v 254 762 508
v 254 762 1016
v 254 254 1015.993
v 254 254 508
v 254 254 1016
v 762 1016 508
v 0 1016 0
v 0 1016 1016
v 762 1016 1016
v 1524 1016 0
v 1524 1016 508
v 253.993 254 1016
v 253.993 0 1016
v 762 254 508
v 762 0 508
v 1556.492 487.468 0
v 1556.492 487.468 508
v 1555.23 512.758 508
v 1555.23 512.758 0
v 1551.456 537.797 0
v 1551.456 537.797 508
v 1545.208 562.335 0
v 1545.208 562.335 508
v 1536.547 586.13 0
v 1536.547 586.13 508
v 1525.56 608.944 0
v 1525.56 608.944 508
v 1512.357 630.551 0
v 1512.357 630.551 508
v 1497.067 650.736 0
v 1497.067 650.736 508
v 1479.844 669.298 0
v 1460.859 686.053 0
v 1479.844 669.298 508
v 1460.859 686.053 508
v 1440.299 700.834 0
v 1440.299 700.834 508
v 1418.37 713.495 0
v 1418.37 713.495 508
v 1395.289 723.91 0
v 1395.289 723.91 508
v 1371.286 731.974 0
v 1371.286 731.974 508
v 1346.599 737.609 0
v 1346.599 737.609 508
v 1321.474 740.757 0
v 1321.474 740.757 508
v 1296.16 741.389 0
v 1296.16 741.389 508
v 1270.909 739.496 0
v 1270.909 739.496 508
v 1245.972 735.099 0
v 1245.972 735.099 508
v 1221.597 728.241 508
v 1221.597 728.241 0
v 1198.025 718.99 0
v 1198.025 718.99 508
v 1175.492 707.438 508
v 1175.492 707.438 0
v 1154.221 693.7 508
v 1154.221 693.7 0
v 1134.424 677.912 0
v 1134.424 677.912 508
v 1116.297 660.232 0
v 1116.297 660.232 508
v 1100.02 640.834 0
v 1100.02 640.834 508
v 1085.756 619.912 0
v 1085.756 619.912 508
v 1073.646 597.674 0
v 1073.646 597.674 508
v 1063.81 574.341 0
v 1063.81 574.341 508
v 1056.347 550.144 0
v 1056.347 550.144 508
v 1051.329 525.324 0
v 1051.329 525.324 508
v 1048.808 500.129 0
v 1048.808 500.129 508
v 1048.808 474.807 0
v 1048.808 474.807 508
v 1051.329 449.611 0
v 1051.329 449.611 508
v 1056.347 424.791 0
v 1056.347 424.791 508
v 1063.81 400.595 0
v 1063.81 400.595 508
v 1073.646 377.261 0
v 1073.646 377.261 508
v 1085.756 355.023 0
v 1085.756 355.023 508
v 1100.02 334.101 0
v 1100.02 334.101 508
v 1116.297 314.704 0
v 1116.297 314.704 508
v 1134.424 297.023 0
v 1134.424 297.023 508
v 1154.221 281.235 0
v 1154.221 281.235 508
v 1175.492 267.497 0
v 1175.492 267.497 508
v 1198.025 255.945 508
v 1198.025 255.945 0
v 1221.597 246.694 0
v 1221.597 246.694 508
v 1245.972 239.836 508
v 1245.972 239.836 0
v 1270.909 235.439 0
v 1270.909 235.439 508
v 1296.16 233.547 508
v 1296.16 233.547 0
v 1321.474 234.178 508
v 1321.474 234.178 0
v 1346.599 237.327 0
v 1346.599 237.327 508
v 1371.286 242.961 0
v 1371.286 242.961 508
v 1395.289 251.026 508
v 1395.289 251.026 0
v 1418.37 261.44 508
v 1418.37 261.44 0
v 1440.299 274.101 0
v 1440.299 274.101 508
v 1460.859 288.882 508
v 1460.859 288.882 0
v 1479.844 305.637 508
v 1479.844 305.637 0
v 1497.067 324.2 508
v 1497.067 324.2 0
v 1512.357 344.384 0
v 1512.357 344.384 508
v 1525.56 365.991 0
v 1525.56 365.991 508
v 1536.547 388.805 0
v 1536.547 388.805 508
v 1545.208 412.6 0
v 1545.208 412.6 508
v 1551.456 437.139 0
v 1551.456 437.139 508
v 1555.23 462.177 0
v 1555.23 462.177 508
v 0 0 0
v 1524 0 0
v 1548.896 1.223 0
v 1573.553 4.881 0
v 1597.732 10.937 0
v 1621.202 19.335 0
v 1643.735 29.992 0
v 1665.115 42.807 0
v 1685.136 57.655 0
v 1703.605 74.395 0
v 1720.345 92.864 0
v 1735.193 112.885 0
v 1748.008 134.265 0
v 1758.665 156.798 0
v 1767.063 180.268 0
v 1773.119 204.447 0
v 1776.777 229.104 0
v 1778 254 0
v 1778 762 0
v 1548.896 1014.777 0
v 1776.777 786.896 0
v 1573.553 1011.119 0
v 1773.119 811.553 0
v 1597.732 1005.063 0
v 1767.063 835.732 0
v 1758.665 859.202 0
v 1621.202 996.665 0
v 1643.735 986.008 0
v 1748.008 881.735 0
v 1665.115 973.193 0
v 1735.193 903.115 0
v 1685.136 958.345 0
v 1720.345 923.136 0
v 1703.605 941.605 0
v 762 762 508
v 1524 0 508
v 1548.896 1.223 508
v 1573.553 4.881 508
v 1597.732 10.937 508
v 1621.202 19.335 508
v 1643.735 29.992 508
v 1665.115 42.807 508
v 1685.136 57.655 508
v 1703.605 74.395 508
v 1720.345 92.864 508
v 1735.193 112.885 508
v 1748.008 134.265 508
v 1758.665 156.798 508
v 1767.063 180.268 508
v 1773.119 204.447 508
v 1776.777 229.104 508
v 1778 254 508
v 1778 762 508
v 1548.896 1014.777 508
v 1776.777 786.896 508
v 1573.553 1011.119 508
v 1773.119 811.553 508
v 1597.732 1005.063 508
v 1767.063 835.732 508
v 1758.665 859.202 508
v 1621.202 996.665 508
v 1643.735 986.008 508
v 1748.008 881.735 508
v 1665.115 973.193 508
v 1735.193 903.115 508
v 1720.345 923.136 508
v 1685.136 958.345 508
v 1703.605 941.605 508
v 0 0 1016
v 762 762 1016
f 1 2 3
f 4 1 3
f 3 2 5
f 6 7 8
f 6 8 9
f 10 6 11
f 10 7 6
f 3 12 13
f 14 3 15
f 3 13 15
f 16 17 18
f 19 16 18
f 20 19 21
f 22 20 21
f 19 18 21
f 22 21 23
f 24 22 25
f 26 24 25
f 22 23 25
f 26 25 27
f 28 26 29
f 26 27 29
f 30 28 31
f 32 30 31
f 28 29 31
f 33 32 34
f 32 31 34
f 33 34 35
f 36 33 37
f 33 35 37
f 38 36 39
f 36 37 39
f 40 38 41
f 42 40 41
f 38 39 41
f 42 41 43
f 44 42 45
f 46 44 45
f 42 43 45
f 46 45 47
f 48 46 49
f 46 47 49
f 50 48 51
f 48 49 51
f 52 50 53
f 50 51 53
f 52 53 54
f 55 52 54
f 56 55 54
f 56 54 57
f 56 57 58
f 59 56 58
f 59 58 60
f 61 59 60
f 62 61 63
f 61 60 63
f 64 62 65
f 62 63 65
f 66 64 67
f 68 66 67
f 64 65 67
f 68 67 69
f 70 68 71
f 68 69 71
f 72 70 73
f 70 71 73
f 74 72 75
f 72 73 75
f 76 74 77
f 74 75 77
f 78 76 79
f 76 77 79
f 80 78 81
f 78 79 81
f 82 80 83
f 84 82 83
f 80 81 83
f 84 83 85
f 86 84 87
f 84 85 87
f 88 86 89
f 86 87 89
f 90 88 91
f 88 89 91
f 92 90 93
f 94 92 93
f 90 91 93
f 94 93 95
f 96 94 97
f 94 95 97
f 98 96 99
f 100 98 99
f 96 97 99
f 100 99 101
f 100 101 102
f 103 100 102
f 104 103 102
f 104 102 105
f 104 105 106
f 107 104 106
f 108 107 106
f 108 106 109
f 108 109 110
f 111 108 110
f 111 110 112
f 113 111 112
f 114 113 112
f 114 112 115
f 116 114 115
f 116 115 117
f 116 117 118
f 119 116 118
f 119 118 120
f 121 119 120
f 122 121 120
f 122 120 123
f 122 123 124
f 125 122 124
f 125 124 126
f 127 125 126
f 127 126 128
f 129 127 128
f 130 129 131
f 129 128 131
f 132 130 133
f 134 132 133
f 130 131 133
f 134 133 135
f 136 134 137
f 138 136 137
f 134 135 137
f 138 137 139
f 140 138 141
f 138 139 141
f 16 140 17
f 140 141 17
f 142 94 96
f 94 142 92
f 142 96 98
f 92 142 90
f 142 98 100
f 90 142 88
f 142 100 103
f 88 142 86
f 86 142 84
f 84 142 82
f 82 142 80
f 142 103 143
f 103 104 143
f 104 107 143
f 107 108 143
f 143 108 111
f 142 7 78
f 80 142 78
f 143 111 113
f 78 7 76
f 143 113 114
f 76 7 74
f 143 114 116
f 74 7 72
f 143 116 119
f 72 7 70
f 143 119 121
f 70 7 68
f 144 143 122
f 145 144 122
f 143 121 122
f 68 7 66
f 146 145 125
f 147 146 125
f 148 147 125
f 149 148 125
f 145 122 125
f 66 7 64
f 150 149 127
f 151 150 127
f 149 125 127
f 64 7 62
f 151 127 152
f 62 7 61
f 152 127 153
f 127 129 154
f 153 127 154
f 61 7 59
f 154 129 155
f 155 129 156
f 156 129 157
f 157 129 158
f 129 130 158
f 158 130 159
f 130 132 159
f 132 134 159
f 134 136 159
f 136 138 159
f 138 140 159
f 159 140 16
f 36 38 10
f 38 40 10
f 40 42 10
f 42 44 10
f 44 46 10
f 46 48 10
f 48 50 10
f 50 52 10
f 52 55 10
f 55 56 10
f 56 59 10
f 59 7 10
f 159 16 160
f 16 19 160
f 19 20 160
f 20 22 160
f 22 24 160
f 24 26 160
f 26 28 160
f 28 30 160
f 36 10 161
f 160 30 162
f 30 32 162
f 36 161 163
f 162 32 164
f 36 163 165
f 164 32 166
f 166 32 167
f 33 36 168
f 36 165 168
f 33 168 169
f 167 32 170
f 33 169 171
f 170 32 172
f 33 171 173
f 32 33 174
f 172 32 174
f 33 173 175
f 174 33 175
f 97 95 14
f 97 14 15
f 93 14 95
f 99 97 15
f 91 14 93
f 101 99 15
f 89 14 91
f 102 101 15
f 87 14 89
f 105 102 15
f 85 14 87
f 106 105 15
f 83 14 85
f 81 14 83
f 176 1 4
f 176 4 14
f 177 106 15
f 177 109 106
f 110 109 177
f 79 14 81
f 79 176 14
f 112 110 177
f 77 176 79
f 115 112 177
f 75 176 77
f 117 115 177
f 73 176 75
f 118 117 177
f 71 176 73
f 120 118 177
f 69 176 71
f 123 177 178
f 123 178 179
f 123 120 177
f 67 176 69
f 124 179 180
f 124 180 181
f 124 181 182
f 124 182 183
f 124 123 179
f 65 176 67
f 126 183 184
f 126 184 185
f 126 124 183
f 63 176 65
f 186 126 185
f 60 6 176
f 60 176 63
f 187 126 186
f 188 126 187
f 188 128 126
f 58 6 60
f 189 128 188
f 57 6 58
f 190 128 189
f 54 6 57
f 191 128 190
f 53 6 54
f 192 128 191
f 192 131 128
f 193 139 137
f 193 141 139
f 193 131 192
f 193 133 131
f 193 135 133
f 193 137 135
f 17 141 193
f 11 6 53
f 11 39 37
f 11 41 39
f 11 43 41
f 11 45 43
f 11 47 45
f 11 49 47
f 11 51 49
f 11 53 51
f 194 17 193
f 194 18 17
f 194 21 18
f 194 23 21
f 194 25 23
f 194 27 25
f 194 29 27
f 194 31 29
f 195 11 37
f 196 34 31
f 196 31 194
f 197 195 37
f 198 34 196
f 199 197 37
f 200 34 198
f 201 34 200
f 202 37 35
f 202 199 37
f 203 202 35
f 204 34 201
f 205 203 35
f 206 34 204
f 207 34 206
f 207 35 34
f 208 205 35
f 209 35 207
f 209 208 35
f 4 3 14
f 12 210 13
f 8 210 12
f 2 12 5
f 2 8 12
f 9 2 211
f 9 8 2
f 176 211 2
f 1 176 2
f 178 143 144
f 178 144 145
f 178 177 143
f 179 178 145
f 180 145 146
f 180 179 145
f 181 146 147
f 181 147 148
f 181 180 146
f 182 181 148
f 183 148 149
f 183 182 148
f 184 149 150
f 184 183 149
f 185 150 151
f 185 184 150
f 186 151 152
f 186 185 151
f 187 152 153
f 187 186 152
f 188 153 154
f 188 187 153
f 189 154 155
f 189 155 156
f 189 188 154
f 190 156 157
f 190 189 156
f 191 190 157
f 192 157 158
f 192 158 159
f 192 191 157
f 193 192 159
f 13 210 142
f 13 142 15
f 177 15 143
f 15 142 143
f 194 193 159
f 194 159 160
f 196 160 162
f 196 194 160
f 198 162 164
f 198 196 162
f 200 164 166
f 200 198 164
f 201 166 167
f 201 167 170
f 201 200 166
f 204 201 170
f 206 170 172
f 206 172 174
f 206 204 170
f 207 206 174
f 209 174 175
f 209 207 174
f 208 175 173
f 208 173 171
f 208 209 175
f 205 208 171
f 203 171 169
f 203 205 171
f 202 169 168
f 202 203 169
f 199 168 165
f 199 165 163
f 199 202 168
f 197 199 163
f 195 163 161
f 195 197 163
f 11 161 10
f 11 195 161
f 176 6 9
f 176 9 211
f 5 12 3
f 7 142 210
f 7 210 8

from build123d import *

# Parameters (mm, degrees)
F0_W     = 1778
F0_H     = 1016
F1_DEPTH = 1016
F3_DEPTH = 508
F6_DEPTH = 254
F4_W     = 508
F4_H     = 254
F7_DEPTH = 175.26
F8_R     = 254
F9_DEPTH = 508
F10_R    = 254
F11_R    = 254


with BuildPart() as f1:
    # F0 (on Top) → F1 (new body)
    with BuildSketch(Plane.XY):
        with Locations((889, 508)):
            Rectangle(F0_W, F0_H)
    extrude(amount=F1_DEPTH)

    # F2 (on face) → F3 (cut)
    with BuildSketch(Plane.XY.offset(1016)):
        Polygon((1778, 1016), (762, 1016), (762, 762), (254, 762), (254, 254), (762, 254), (762, 0), (1778, 0), align=None)
    extrude(amount=-F3_DEPTH, mode=Mode.SUBTRACT)

    # F5 (on face) → F6 (cut)
    with BuildSketch(Plane.XZ):
        Polygon((762, 1016), (253.9933919907, 1016), (762, 508), align=None)
    extrude(amount=-F6_DEPTH, mode=Mode.SUBTRACT)

    # F4 (on face) → F7 (cut)
    with BuildSketch(Plane.XY.offset(1016)):
        with Locations((508, 127)):
            Rectangle(F4_W, F4_H)
    extrude(amount=F7_DEPTH, mode=Mode.SUBTRACT)

    # F8 (on face) → F9 (cut)
    with BuildSketch(Plane.XY.offset(508)):
        with Locations((1302.4921417236, 487.4676764011)):
            Circle(F8_R)
    extrude(amount=-F9_DEPTH, mode=Mode.SUBTRACT)

    # F10
    f10_edges = [f1.edges().sort_by_distance(p)[0] for p in [
        (1778, 0, 254),
    ]]
    fillet(f10_edges, radius=F10_R)

    # F11
    f11_edges = [f1.edges().sort_by_distance(p)[0] for p in [
        (1778, 1016, 254),
    ]]
    fillet(f11_edges, radius=F11_R)


solid = f1.part
